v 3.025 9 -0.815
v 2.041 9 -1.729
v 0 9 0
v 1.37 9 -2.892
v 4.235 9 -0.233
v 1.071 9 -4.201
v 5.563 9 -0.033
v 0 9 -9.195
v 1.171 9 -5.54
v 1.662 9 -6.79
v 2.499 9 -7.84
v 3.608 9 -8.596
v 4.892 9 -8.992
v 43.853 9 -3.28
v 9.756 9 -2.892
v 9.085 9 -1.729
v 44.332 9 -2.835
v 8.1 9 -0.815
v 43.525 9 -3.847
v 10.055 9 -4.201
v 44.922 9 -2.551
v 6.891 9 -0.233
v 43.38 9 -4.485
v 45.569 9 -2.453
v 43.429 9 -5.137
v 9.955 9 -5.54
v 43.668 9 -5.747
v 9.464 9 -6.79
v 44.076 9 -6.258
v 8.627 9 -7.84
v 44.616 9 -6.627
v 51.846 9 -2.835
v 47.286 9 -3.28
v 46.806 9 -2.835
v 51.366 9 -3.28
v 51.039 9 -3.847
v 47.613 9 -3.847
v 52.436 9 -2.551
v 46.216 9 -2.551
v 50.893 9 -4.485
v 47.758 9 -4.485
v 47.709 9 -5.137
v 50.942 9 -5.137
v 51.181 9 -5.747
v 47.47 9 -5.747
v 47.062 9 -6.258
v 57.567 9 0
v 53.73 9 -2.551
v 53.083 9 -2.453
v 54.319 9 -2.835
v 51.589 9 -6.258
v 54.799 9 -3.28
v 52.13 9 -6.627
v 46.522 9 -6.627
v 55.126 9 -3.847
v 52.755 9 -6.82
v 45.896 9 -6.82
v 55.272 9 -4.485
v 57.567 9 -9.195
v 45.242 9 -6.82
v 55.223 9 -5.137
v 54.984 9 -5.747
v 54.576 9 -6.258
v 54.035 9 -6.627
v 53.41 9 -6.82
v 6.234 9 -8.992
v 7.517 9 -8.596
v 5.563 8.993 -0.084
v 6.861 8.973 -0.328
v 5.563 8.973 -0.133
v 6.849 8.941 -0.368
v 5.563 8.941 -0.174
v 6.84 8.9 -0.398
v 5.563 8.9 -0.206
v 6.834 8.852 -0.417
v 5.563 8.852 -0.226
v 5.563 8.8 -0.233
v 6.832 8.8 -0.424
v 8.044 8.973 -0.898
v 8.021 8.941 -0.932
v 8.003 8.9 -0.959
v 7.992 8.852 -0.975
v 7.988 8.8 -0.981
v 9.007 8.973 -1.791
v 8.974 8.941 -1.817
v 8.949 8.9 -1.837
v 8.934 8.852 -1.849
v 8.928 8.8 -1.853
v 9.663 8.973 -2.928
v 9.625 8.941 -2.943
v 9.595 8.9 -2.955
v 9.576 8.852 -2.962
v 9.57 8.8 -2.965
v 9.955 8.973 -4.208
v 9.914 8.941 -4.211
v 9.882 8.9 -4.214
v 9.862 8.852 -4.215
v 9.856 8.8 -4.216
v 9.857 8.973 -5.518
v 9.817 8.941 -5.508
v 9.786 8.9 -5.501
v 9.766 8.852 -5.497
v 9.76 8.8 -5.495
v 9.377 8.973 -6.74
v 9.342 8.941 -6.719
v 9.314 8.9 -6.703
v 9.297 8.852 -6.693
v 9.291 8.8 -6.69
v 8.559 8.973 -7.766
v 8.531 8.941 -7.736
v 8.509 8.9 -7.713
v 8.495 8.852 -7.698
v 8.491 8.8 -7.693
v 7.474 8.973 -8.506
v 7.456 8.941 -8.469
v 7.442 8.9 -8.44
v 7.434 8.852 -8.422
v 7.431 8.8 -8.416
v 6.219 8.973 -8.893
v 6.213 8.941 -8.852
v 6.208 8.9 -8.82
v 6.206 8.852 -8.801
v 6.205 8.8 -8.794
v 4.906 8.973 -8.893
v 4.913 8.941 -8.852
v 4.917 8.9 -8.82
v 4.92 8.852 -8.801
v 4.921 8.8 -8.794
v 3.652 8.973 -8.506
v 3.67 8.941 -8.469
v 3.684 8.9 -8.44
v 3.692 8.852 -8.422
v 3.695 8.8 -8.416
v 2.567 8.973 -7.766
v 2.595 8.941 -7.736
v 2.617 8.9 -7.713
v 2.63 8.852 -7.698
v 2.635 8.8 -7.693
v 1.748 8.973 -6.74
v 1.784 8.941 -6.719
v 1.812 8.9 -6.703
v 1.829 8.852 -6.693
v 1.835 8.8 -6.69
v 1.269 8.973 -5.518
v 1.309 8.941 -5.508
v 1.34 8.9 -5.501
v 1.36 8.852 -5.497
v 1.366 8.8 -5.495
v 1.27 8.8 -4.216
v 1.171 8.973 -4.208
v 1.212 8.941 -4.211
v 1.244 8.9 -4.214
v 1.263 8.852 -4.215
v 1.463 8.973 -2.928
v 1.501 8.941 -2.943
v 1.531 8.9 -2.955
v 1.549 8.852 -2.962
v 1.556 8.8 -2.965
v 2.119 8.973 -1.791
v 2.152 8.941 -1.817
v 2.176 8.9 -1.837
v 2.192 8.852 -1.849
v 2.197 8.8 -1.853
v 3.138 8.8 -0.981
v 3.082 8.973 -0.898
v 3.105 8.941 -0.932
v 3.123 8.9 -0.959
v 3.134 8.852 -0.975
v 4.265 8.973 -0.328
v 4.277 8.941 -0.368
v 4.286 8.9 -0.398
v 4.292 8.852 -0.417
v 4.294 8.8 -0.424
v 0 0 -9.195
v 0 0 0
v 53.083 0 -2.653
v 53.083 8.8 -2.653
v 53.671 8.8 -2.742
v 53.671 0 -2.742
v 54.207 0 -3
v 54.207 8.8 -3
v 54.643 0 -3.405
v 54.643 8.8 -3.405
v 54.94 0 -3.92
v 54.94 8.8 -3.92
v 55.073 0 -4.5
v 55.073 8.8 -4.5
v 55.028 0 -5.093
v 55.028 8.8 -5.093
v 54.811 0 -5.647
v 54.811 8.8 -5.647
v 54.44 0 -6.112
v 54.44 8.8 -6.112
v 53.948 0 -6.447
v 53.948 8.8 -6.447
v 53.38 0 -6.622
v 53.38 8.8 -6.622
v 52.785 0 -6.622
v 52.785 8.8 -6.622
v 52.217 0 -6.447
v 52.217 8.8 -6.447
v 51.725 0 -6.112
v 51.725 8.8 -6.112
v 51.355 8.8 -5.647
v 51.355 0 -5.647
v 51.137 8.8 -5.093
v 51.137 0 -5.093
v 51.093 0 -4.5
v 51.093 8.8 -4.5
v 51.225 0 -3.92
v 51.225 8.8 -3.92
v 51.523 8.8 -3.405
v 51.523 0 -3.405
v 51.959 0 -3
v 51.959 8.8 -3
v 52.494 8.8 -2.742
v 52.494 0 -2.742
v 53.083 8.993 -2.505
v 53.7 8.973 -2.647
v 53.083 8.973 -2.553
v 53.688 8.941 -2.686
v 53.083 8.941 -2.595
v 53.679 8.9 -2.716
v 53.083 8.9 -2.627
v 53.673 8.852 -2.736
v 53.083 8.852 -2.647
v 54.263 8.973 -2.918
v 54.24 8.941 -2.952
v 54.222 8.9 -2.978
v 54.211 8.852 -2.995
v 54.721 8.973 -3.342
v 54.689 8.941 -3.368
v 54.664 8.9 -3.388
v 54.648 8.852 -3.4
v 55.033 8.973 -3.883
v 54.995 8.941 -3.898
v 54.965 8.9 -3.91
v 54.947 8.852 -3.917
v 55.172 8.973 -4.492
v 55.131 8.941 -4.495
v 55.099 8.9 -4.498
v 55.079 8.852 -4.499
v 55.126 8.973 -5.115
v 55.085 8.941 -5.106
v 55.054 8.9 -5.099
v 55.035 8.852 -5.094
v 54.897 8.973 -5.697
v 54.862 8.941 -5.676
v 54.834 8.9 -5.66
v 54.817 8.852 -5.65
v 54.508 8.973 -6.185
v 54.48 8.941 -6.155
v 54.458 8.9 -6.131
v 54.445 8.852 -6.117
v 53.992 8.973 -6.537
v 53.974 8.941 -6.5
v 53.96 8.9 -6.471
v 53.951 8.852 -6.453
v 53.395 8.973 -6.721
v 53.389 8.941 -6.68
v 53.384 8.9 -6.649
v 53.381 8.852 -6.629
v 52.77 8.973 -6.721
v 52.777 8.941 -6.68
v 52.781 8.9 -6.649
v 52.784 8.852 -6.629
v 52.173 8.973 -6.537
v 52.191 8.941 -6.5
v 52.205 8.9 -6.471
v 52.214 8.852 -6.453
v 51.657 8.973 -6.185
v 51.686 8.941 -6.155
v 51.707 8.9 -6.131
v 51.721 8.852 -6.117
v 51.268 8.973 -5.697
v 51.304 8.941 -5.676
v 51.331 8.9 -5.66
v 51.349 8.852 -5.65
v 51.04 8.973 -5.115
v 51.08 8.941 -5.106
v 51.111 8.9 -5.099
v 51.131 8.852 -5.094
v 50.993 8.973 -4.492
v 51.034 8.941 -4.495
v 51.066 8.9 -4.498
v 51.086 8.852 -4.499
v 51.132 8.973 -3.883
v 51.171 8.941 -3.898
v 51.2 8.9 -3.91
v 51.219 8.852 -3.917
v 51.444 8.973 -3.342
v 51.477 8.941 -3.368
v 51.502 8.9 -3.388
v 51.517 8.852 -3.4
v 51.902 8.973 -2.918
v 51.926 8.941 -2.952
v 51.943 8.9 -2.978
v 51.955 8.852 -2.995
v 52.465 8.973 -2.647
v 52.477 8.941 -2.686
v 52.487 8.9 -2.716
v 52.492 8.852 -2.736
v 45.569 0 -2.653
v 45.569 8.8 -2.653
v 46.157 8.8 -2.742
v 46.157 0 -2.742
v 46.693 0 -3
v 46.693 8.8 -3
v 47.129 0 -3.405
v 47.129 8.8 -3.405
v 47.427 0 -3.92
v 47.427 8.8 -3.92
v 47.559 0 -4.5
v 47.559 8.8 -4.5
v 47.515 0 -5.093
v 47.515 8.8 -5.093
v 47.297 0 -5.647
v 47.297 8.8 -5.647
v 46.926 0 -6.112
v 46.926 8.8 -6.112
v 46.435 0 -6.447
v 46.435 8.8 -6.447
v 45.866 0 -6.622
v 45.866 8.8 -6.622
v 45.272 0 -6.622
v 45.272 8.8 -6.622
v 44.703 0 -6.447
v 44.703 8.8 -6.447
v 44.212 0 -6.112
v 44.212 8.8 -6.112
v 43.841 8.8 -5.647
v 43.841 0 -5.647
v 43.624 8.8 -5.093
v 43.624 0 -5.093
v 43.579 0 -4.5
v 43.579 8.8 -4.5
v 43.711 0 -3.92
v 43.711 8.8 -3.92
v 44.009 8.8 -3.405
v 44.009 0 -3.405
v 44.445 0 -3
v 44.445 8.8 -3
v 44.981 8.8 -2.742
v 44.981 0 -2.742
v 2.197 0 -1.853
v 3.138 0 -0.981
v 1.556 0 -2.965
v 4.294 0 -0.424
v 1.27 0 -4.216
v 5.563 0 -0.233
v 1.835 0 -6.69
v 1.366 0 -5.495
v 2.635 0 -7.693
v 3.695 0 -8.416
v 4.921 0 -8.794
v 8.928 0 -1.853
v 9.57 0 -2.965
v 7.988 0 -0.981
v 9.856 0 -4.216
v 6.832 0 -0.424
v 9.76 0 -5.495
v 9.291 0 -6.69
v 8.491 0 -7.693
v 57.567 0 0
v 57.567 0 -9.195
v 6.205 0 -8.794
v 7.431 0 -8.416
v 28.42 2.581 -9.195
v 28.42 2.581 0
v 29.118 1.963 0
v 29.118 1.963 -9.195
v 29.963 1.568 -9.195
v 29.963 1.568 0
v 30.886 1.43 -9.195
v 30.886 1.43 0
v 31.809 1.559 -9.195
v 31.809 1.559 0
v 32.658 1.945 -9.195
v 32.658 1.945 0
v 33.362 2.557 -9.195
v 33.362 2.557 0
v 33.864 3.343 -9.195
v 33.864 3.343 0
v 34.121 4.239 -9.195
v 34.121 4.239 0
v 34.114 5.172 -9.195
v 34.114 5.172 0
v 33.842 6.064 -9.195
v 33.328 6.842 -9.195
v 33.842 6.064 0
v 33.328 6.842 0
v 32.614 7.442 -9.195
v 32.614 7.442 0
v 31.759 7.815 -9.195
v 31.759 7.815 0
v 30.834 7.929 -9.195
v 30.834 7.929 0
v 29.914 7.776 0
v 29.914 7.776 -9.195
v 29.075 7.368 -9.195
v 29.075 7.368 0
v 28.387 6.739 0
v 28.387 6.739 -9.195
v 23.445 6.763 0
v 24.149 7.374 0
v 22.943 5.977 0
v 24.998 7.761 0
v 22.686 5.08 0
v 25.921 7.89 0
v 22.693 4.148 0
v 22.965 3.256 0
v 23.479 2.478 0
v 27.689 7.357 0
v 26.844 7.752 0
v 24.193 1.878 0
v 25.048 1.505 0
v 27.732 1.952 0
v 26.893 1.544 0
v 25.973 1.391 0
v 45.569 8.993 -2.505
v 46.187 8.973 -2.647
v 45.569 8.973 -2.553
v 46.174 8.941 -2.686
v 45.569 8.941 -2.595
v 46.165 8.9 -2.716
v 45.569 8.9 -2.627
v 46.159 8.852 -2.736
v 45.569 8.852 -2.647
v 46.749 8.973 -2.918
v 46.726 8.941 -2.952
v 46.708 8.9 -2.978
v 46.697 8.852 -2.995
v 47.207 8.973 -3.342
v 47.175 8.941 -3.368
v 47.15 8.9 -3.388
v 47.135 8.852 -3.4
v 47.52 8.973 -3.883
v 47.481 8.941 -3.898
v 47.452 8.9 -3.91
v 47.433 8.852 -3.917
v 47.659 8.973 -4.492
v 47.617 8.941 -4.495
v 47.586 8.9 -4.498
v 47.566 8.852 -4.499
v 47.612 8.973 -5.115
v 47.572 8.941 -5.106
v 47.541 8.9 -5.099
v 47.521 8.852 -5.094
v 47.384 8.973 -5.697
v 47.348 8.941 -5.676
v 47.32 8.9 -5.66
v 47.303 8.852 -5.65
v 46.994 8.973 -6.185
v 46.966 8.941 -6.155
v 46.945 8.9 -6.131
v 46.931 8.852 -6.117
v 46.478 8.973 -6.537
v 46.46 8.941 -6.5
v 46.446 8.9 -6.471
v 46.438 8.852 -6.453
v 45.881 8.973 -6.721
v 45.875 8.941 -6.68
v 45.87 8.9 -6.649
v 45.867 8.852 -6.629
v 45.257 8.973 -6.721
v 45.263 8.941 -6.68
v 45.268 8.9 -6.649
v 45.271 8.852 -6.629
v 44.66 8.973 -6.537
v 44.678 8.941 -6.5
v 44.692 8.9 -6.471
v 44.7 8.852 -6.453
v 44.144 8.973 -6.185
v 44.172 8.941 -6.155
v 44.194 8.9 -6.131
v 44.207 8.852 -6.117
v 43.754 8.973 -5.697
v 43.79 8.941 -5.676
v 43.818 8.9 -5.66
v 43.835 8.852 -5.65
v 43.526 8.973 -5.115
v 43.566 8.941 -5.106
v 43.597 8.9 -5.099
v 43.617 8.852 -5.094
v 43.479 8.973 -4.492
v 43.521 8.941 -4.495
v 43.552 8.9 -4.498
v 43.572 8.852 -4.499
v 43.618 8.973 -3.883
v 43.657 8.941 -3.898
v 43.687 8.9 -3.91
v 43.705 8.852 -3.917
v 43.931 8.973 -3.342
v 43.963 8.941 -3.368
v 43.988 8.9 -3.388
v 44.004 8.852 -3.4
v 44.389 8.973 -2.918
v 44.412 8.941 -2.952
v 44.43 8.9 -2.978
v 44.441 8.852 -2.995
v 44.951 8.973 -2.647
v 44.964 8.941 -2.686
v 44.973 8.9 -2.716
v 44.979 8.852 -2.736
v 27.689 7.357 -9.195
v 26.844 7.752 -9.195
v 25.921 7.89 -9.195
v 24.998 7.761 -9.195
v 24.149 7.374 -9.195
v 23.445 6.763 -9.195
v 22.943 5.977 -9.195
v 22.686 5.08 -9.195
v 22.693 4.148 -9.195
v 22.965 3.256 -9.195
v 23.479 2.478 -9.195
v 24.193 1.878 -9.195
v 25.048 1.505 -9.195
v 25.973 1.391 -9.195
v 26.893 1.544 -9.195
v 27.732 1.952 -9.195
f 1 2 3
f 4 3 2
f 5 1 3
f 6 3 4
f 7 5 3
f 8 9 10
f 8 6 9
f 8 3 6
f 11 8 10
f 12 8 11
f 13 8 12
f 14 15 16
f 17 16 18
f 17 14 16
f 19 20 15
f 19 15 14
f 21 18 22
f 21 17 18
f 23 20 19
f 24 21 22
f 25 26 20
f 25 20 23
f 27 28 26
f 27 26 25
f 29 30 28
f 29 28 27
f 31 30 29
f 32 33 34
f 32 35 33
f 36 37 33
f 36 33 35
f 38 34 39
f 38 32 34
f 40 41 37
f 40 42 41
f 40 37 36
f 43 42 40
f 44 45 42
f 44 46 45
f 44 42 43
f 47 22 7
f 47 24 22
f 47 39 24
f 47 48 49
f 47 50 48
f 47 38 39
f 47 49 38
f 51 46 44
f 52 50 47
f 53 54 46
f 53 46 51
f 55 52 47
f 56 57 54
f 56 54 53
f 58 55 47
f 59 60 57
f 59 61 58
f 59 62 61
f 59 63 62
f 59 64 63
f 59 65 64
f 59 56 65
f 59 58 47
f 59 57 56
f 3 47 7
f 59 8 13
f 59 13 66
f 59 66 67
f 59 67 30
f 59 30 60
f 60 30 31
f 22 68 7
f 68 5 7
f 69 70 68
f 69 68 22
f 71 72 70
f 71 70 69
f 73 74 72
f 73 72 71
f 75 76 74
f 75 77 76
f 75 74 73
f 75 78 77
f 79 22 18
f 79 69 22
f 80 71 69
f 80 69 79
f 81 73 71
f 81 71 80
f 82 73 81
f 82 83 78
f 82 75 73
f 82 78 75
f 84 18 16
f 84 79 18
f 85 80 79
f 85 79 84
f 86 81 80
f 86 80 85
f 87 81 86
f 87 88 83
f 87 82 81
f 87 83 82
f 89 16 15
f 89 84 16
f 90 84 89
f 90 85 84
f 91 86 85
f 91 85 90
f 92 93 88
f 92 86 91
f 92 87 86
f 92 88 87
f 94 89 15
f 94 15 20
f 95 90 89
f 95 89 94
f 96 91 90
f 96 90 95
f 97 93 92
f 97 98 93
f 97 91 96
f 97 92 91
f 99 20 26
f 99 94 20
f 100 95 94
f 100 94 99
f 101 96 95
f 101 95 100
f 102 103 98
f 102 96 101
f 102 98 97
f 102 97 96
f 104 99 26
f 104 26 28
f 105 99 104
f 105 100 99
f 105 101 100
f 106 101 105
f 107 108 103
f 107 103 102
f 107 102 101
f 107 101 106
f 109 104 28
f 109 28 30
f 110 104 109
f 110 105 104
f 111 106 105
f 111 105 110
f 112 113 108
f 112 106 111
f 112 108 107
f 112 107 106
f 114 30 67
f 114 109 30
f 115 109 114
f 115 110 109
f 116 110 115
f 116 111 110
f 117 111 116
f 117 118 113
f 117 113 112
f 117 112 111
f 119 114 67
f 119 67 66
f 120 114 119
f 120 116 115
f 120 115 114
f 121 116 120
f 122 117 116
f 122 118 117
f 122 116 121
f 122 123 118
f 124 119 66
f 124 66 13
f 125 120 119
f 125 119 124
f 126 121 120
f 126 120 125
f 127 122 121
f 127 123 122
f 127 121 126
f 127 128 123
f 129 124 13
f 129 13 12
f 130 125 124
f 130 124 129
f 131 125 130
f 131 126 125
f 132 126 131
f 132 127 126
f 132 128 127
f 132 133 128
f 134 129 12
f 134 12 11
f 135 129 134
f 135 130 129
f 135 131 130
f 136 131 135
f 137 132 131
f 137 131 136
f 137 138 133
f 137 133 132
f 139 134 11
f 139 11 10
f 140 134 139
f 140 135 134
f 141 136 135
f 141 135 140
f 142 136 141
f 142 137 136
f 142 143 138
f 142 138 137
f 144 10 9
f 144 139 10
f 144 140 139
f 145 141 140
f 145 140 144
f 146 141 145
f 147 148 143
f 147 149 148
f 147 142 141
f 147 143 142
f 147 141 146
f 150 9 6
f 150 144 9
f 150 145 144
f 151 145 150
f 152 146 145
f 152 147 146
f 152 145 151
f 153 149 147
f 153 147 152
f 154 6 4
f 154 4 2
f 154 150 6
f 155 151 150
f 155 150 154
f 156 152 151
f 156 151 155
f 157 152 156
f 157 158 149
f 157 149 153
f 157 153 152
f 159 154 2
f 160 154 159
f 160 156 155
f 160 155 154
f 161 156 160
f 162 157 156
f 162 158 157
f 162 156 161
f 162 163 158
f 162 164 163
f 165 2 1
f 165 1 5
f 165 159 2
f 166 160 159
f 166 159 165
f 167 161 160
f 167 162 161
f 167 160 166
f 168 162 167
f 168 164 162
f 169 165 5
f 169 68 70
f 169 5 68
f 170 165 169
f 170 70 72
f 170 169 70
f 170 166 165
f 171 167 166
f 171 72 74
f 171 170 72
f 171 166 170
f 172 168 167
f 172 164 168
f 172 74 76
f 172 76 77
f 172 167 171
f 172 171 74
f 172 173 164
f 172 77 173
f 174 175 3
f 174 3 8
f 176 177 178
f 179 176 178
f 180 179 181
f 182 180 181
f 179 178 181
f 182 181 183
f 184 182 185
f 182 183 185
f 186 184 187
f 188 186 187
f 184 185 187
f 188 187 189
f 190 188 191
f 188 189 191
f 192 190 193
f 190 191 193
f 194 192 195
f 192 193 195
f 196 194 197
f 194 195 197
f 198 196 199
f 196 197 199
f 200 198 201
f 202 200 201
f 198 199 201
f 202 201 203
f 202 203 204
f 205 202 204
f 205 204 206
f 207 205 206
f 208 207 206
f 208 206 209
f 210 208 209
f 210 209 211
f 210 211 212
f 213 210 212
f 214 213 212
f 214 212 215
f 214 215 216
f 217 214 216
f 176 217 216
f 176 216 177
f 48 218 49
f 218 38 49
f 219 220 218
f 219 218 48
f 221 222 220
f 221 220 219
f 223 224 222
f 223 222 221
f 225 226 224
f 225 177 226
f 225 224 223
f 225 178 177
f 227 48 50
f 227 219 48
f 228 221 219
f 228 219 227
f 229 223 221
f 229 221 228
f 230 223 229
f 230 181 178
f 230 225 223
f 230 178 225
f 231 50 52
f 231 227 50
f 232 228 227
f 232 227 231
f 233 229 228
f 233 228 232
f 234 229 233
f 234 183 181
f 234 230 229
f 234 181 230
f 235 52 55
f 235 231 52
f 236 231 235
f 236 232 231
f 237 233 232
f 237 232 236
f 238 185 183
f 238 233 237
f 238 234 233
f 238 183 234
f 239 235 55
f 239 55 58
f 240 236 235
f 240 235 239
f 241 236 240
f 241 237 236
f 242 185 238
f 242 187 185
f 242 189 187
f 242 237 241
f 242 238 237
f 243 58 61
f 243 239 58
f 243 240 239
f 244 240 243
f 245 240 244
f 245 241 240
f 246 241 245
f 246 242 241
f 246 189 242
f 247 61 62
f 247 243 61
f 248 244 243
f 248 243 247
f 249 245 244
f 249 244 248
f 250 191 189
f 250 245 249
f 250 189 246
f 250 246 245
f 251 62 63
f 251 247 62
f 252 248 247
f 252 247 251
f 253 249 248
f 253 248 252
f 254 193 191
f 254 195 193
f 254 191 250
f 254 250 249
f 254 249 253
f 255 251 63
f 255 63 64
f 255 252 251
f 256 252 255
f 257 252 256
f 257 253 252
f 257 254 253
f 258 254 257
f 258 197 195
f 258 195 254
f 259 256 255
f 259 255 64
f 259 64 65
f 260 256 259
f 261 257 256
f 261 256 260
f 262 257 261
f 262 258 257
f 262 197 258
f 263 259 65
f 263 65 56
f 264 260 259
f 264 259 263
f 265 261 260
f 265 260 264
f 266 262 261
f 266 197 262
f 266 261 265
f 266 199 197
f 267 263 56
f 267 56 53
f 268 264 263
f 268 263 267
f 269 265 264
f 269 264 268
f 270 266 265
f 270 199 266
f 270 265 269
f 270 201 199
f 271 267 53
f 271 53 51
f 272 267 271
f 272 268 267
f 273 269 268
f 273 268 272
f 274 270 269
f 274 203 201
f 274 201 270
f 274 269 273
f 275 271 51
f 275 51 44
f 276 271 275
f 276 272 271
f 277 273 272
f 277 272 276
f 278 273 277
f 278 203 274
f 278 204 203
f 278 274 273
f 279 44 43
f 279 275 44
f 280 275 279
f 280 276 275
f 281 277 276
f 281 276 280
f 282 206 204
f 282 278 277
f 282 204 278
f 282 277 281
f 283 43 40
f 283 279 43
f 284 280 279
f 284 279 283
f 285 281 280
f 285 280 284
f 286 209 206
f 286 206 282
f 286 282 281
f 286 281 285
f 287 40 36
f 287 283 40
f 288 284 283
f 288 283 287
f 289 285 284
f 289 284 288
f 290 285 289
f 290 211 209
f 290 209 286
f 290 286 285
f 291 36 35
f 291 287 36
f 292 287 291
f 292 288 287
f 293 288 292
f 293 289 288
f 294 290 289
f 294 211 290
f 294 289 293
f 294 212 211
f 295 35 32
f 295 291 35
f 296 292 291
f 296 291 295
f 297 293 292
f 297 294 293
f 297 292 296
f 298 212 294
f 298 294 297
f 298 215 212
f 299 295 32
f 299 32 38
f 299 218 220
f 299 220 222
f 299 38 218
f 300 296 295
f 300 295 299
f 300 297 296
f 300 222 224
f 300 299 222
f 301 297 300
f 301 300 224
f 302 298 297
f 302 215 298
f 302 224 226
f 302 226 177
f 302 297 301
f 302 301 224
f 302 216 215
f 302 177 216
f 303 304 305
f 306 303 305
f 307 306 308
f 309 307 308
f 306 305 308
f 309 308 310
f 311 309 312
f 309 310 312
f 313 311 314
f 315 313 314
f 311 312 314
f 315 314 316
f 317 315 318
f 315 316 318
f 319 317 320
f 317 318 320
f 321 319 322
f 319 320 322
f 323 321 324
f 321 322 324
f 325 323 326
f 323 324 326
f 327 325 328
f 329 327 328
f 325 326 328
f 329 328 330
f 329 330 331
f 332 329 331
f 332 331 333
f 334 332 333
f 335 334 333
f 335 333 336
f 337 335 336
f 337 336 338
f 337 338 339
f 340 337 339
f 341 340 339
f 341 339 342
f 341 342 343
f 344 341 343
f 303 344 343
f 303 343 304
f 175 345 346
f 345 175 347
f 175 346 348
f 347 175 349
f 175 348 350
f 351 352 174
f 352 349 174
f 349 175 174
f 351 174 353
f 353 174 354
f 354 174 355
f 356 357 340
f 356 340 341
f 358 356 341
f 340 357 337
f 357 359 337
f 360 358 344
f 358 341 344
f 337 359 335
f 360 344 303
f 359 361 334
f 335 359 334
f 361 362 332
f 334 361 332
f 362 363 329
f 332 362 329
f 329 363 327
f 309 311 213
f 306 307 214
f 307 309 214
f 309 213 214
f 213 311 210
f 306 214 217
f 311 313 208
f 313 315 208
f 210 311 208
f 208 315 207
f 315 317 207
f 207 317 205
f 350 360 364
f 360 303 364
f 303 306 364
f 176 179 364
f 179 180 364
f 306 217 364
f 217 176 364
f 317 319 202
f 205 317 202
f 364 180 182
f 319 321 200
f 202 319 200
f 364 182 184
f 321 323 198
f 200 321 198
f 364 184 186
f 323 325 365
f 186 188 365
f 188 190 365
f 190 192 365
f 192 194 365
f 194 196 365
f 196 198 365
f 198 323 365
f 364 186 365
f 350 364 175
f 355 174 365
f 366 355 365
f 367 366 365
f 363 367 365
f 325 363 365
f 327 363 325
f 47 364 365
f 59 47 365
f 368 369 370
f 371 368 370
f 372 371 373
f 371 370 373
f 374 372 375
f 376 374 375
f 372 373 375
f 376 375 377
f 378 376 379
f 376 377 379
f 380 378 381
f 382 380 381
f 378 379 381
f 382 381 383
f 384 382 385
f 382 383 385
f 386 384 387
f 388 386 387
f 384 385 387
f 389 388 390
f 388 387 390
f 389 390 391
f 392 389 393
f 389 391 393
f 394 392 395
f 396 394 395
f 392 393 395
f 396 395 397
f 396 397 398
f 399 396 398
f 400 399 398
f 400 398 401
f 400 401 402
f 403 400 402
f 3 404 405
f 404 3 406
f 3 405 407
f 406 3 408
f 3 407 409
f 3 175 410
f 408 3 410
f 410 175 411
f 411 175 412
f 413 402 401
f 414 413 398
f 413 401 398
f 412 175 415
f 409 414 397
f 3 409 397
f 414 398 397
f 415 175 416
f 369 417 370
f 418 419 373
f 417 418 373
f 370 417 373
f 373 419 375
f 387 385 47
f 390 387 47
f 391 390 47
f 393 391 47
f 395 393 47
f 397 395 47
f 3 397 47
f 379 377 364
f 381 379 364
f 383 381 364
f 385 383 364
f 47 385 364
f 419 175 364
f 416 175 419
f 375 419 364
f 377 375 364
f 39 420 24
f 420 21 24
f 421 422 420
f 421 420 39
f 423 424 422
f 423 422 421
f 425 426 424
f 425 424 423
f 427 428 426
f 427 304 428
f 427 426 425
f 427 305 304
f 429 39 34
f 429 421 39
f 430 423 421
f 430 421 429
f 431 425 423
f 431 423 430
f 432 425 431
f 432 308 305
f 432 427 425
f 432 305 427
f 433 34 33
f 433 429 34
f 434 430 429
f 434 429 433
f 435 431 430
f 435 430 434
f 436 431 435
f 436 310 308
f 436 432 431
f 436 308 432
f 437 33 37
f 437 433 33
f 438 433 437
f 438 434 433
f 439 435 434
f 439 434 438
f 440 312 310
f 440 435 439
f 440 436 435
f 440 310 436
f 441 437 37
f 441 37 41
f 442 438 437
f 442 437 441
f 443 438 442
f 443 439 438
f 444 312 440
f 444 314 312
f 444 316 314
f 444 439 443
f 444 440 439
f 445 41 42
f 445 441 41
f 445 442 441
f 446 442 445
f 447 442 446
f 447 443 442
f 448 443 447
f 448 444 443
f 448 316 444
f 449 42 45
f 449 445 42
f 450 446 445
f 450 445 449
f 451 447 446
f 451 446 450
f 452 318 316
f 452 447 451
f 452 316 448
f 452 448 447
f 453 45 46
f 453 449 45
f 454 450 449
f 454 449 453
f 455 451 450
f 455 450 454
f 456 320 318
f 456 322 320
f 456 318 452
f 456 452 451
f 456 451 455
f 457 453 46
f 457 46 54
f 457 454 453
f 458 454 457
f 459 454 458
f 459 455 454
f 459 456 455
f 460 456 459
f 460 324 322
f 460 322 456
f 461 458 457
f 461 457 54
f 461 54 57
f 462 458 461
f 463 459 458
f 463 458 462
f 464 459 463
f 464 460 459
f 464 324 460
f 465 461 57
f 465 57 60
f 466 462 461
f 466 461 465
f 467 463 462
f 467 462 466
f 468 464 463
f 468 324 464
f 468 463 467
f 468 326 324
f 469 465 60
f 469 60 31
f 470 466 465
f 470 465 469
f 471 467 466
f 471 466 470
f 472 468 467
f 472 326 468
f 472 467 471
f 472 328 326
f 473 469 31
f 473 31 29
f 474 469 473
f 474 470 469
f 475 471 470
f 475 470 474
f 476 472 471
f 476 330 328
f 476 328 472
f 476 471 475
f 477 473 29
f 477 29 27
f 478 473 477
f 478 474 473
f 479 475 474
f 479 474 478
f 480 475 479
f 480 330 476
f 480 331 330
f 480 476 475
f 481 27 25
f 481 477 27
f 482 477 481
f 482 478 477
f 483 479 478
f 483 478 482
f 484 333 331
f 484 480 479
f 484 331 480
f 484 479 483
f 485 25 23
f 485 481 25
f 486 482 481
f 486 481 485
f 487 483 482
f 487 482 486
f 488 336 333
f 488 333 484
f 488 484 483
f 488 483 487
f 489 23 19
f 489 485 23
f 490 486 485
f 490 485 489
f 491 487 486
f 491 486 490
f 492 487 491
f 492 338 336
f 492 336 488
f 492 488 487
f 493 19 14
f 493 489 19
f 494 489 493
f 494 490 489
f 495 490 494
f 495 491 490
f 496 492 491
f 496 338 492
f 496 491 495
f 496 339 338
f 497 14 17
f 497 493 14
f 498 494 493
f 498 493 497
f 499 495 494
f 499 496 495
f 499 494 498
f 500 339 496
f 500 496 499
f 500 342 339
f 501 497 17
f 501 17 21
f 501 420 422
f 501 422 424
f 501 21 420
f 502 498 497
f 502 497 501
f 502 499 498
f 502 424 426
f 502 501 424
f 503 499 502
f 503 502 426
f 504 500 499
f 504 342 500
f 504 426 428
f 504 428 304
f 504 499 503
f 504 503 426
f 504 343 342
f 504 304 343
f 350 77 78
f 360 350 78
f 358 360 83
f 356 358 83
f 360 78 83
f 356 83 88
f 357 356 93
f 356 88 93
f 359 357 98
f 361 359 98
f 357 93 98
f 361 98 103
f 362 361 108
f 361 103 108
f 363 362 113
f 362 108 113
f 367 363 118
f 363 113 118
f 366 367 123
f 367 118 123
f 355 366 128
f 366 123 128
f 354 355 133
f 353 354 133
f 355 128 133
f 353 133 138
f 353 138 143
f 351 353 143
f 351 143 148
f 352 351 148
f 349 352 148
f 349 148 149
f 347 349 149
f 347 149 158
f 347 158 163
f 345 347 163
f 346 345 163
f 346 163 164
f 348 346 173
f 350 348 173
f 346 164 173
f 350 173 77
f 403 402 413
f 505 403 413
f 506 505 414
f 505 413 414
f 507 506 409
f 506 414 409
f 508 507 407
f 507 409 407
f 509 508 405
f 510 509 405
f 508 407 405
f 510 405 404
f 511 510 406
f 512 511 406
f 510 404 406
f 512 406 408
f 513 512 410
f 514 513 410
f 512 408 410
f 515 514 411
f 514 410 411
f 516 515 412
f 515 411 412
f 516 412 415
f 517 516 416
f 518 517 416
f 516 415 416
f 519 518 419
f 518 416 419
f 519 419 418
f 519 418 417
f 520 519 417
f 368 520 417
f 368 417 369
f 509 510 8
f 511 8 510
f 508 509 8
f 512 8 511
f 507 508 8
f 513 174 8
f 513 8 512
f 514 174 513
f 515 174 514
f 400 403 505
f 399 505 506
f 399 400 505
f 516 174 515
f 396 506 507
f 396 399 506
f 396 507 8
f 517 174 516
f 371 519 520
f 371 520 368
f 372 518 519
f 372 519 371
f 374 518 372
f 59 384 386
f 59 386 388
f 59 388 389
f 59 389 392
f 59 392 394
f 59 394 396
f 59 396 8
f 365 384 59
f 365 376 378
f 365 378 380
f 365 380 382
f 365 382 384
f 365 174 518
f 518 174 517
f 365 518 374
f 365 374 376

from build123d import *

# Parameters (mm, degrees)
SKETCH_1_W          = 57.566503366
SKETCH_1_H          = 9.194649843
EXTRUDE_2_DEPTH     = 9
SKETCH_2_R          = 4.304670881
CUT_EXTRUDE_1_DEPTH = 9
SKETCH_3_R          = 3.25
CUT_EXTRUDE_4_DEPTH = 59.986811199
SKETCH_4_R          = 1.995507564
CUT_EXTRUDE_5_DEPTH = 59.986811199
FILLET_4_R          = 0.2


with BuildPart() as part:
    # 草图1 → 凸台-拉伸2 (new body)
    with BuildSketch(Plane(origin=(0, 0, 0), x_dir=(1, 0, 0), z_dir=(0, 1, 0))):
        with Locations((28.783251683, 4.597324922)):
            Rectangle(SKETCH_1_W, SKETCH_1_H)
    extrude(amount=EXTRUDE_2_DEPTH)

    # 草图2 → 切除-拉伸1 (cut)
    with BuildSketch(Plane(origin=(0, 9, 0), x_dir=(1, 0, 0), z_dir=(0, 1, 0))):
        with Locations(Location((5.562922539, 4.537375707, 0), (0, 0, 270))):
            Circle(SKETCH_2_R)
    extrude(amount=-CUT_EXTRUDE_1_DEPTH, mode=Mode.SUBTRACT)

    # 草图3 → 切除-拉伸4 (cut, through all)
    with BuildSketch(Plane.XY):
        with Locations((25.905689379, 4.639881501)):
            Circle(SKETCH_3_R)
        with Locations((30.901457267, 4.679847644)):
            Circle(SKETCH_3_R)
    extrude(amount=-CUT_EXTRUDE_4_DEPTH, mode=Mode.SUBTRACT)

    # 草图4 → 切除-拉伸5 (cut, through all)
    with BuildSketch(Plane(origin=(0, 9, 0), x_dir=(1, 0, 0), z_dir=(0, 1, 0))):
        with Locations(Location((45.569031787, 4.648915429, 0), (0, 0, 270))):
            Circle(SKETCH_4_R)
        with Locations(Location((53.08266669, 4.648915429, 0), (0, 0, 270))):
            Circle(SKETCH_4_R)
    extrude(amount=-CUT_EXTRUDE_5_DEPTH, mode=Mode.SUBTRACT)

    # 圆角4
    fillet_4_edges = [part.edges().sort_by_distance(p)[0] for p in [
        (5.562922539, 9, -8.842046587),
        (45.569031787, 9, -6.644422993),
        (53.08266669, 9, -6.644422993),
    ]]
    fillet(fillet_4_edges, radius=FILLET_4_R)


solid = part.part
